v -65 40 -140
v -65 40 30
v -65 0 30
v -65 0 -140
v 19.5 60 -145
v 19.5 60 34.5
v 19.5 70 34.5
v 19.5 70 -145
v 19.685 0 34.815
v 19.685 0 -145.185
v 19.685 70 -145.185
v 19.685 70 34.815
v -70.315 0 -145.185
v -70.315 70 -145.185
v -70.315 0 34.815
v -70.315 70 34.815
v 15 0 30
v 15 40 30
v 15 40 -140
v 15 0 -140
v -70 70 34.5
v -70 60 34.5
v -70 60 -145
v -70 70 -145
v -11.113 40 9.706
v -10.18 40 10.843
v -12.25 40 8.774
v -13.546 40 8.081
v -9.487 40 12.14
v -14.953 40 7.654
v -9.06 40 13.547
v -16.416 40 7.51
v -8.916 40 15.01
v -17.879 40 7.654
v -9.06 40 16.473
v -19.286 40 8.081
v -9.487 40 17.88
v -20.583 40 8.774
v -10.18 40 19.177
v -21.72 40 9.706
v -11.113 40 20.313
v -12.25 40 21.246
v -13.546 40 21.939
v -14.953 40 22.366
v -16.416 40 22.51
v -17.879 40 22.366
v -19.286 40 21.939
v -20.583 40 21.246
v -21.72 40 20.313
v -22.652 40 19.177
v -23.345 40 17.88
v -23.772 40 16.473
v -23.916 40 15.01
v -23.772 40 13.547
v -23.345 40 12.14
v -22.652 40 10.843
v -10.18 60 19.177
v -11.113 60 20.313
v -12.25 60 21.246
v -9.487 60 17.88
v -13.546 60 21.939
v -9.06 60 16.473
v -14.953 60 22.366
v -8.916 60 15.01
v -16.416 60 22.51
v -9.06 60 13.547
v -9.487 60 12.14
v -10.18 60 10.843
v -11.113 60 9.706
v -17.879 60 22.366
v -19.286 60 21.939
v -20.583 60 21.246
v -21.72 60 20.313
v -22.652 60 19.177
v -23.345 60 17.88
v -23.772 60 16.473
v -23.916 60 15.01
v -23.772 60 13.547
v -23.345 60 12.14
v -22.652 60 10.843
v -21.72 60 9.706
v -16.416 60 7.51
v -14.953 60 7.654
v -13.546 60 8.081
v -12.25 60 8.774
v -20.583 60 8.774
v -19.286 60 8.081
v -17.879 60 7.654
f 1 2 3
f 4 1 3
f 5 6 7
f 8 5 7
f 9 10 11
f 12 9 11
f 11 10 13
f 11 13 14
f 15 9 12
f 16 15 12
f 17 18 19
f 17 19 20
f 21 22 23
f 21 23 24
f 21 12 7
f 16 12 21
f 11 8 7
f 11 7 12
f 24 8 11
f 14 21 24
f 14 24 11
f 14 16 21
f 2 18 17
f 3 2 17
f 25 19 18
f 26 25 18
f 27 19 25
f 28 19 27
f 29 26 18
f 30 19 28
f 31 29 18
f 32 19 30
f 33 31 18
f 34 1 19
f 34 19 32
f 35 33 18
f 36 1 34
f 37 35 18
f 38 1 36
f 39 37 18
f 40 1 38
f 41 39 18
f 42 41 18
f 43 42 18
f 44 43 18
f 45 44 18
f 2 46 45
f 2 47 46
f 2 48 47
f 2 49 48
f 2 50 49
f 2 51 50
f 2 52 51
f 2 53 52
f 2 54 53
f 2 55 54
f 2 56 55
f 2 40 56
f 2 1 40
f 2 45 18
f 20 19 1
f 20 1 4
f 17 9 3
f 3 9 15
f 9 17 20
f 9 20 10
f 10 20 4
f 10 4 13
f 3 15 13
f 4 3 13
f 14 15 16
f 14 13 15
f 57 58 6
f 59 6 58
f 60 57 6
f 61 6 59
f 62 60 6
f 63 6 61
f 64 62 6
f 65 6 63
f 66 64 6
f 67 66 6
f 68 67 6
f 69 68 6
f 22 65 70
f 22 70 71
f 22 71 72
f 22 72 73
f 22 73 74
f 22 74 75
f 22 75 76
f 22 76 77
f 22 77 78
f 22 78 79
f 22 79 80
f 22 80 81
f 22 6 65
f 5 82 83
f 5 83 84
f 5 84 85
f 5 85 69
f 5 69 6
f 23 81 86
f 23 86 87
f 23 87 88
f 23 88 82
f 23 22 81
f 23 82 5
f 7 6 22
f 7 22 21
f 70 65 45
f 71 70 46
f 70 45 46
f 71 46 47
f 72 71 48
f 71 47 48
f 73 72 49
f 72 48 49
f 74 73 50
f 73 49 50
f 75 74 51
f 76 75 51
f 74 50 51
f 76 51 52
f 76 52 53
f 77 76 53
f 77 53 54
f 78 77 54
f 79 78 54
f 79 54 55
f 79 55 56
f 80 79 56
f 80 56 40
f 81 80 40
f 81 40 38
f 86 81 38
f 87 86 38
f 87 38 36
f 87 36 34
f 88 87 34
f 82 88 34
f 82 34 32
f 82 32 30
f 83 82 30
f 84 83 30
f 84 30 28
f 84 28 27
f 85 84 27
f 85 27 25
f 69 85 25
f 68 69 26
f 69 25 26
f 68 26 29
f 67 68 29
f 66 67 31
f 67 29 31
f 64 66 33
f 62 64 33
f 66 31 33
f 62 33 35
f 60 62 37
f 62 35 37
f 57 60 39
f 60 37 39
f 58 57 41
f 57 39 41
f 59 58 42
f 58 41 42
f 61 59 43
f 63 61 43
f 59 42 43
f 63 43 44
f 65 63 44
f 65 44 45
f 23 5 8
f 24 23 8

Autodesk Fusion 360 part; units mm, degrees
box "Grundkörper Quader1" add length 180 width 90 height 70 placed x (0, 0, -1) y (-1, 0, 0) z (0, 1, 0) at (19.6846, 0, 34.8152)
box "Grundkörper Quader2" cut length 179.5 width 89.5 height -10 placed x (0, 0, -1) y (-1, 0, 0) z (0, 1, 0) at (19.5, 70, 34.5)
box "Grundkörper Quader3" cut length 170 width 80 height -40 placed x (0, 0, 1) y (-1, 0, 0) z (0, -1, 0) at (15, 0, -140)
hole "Bohrung1" at (-16.4163, 60, 15.0098) direction (0, -1, 0) diameter 15 depth 40 tip angle 180
